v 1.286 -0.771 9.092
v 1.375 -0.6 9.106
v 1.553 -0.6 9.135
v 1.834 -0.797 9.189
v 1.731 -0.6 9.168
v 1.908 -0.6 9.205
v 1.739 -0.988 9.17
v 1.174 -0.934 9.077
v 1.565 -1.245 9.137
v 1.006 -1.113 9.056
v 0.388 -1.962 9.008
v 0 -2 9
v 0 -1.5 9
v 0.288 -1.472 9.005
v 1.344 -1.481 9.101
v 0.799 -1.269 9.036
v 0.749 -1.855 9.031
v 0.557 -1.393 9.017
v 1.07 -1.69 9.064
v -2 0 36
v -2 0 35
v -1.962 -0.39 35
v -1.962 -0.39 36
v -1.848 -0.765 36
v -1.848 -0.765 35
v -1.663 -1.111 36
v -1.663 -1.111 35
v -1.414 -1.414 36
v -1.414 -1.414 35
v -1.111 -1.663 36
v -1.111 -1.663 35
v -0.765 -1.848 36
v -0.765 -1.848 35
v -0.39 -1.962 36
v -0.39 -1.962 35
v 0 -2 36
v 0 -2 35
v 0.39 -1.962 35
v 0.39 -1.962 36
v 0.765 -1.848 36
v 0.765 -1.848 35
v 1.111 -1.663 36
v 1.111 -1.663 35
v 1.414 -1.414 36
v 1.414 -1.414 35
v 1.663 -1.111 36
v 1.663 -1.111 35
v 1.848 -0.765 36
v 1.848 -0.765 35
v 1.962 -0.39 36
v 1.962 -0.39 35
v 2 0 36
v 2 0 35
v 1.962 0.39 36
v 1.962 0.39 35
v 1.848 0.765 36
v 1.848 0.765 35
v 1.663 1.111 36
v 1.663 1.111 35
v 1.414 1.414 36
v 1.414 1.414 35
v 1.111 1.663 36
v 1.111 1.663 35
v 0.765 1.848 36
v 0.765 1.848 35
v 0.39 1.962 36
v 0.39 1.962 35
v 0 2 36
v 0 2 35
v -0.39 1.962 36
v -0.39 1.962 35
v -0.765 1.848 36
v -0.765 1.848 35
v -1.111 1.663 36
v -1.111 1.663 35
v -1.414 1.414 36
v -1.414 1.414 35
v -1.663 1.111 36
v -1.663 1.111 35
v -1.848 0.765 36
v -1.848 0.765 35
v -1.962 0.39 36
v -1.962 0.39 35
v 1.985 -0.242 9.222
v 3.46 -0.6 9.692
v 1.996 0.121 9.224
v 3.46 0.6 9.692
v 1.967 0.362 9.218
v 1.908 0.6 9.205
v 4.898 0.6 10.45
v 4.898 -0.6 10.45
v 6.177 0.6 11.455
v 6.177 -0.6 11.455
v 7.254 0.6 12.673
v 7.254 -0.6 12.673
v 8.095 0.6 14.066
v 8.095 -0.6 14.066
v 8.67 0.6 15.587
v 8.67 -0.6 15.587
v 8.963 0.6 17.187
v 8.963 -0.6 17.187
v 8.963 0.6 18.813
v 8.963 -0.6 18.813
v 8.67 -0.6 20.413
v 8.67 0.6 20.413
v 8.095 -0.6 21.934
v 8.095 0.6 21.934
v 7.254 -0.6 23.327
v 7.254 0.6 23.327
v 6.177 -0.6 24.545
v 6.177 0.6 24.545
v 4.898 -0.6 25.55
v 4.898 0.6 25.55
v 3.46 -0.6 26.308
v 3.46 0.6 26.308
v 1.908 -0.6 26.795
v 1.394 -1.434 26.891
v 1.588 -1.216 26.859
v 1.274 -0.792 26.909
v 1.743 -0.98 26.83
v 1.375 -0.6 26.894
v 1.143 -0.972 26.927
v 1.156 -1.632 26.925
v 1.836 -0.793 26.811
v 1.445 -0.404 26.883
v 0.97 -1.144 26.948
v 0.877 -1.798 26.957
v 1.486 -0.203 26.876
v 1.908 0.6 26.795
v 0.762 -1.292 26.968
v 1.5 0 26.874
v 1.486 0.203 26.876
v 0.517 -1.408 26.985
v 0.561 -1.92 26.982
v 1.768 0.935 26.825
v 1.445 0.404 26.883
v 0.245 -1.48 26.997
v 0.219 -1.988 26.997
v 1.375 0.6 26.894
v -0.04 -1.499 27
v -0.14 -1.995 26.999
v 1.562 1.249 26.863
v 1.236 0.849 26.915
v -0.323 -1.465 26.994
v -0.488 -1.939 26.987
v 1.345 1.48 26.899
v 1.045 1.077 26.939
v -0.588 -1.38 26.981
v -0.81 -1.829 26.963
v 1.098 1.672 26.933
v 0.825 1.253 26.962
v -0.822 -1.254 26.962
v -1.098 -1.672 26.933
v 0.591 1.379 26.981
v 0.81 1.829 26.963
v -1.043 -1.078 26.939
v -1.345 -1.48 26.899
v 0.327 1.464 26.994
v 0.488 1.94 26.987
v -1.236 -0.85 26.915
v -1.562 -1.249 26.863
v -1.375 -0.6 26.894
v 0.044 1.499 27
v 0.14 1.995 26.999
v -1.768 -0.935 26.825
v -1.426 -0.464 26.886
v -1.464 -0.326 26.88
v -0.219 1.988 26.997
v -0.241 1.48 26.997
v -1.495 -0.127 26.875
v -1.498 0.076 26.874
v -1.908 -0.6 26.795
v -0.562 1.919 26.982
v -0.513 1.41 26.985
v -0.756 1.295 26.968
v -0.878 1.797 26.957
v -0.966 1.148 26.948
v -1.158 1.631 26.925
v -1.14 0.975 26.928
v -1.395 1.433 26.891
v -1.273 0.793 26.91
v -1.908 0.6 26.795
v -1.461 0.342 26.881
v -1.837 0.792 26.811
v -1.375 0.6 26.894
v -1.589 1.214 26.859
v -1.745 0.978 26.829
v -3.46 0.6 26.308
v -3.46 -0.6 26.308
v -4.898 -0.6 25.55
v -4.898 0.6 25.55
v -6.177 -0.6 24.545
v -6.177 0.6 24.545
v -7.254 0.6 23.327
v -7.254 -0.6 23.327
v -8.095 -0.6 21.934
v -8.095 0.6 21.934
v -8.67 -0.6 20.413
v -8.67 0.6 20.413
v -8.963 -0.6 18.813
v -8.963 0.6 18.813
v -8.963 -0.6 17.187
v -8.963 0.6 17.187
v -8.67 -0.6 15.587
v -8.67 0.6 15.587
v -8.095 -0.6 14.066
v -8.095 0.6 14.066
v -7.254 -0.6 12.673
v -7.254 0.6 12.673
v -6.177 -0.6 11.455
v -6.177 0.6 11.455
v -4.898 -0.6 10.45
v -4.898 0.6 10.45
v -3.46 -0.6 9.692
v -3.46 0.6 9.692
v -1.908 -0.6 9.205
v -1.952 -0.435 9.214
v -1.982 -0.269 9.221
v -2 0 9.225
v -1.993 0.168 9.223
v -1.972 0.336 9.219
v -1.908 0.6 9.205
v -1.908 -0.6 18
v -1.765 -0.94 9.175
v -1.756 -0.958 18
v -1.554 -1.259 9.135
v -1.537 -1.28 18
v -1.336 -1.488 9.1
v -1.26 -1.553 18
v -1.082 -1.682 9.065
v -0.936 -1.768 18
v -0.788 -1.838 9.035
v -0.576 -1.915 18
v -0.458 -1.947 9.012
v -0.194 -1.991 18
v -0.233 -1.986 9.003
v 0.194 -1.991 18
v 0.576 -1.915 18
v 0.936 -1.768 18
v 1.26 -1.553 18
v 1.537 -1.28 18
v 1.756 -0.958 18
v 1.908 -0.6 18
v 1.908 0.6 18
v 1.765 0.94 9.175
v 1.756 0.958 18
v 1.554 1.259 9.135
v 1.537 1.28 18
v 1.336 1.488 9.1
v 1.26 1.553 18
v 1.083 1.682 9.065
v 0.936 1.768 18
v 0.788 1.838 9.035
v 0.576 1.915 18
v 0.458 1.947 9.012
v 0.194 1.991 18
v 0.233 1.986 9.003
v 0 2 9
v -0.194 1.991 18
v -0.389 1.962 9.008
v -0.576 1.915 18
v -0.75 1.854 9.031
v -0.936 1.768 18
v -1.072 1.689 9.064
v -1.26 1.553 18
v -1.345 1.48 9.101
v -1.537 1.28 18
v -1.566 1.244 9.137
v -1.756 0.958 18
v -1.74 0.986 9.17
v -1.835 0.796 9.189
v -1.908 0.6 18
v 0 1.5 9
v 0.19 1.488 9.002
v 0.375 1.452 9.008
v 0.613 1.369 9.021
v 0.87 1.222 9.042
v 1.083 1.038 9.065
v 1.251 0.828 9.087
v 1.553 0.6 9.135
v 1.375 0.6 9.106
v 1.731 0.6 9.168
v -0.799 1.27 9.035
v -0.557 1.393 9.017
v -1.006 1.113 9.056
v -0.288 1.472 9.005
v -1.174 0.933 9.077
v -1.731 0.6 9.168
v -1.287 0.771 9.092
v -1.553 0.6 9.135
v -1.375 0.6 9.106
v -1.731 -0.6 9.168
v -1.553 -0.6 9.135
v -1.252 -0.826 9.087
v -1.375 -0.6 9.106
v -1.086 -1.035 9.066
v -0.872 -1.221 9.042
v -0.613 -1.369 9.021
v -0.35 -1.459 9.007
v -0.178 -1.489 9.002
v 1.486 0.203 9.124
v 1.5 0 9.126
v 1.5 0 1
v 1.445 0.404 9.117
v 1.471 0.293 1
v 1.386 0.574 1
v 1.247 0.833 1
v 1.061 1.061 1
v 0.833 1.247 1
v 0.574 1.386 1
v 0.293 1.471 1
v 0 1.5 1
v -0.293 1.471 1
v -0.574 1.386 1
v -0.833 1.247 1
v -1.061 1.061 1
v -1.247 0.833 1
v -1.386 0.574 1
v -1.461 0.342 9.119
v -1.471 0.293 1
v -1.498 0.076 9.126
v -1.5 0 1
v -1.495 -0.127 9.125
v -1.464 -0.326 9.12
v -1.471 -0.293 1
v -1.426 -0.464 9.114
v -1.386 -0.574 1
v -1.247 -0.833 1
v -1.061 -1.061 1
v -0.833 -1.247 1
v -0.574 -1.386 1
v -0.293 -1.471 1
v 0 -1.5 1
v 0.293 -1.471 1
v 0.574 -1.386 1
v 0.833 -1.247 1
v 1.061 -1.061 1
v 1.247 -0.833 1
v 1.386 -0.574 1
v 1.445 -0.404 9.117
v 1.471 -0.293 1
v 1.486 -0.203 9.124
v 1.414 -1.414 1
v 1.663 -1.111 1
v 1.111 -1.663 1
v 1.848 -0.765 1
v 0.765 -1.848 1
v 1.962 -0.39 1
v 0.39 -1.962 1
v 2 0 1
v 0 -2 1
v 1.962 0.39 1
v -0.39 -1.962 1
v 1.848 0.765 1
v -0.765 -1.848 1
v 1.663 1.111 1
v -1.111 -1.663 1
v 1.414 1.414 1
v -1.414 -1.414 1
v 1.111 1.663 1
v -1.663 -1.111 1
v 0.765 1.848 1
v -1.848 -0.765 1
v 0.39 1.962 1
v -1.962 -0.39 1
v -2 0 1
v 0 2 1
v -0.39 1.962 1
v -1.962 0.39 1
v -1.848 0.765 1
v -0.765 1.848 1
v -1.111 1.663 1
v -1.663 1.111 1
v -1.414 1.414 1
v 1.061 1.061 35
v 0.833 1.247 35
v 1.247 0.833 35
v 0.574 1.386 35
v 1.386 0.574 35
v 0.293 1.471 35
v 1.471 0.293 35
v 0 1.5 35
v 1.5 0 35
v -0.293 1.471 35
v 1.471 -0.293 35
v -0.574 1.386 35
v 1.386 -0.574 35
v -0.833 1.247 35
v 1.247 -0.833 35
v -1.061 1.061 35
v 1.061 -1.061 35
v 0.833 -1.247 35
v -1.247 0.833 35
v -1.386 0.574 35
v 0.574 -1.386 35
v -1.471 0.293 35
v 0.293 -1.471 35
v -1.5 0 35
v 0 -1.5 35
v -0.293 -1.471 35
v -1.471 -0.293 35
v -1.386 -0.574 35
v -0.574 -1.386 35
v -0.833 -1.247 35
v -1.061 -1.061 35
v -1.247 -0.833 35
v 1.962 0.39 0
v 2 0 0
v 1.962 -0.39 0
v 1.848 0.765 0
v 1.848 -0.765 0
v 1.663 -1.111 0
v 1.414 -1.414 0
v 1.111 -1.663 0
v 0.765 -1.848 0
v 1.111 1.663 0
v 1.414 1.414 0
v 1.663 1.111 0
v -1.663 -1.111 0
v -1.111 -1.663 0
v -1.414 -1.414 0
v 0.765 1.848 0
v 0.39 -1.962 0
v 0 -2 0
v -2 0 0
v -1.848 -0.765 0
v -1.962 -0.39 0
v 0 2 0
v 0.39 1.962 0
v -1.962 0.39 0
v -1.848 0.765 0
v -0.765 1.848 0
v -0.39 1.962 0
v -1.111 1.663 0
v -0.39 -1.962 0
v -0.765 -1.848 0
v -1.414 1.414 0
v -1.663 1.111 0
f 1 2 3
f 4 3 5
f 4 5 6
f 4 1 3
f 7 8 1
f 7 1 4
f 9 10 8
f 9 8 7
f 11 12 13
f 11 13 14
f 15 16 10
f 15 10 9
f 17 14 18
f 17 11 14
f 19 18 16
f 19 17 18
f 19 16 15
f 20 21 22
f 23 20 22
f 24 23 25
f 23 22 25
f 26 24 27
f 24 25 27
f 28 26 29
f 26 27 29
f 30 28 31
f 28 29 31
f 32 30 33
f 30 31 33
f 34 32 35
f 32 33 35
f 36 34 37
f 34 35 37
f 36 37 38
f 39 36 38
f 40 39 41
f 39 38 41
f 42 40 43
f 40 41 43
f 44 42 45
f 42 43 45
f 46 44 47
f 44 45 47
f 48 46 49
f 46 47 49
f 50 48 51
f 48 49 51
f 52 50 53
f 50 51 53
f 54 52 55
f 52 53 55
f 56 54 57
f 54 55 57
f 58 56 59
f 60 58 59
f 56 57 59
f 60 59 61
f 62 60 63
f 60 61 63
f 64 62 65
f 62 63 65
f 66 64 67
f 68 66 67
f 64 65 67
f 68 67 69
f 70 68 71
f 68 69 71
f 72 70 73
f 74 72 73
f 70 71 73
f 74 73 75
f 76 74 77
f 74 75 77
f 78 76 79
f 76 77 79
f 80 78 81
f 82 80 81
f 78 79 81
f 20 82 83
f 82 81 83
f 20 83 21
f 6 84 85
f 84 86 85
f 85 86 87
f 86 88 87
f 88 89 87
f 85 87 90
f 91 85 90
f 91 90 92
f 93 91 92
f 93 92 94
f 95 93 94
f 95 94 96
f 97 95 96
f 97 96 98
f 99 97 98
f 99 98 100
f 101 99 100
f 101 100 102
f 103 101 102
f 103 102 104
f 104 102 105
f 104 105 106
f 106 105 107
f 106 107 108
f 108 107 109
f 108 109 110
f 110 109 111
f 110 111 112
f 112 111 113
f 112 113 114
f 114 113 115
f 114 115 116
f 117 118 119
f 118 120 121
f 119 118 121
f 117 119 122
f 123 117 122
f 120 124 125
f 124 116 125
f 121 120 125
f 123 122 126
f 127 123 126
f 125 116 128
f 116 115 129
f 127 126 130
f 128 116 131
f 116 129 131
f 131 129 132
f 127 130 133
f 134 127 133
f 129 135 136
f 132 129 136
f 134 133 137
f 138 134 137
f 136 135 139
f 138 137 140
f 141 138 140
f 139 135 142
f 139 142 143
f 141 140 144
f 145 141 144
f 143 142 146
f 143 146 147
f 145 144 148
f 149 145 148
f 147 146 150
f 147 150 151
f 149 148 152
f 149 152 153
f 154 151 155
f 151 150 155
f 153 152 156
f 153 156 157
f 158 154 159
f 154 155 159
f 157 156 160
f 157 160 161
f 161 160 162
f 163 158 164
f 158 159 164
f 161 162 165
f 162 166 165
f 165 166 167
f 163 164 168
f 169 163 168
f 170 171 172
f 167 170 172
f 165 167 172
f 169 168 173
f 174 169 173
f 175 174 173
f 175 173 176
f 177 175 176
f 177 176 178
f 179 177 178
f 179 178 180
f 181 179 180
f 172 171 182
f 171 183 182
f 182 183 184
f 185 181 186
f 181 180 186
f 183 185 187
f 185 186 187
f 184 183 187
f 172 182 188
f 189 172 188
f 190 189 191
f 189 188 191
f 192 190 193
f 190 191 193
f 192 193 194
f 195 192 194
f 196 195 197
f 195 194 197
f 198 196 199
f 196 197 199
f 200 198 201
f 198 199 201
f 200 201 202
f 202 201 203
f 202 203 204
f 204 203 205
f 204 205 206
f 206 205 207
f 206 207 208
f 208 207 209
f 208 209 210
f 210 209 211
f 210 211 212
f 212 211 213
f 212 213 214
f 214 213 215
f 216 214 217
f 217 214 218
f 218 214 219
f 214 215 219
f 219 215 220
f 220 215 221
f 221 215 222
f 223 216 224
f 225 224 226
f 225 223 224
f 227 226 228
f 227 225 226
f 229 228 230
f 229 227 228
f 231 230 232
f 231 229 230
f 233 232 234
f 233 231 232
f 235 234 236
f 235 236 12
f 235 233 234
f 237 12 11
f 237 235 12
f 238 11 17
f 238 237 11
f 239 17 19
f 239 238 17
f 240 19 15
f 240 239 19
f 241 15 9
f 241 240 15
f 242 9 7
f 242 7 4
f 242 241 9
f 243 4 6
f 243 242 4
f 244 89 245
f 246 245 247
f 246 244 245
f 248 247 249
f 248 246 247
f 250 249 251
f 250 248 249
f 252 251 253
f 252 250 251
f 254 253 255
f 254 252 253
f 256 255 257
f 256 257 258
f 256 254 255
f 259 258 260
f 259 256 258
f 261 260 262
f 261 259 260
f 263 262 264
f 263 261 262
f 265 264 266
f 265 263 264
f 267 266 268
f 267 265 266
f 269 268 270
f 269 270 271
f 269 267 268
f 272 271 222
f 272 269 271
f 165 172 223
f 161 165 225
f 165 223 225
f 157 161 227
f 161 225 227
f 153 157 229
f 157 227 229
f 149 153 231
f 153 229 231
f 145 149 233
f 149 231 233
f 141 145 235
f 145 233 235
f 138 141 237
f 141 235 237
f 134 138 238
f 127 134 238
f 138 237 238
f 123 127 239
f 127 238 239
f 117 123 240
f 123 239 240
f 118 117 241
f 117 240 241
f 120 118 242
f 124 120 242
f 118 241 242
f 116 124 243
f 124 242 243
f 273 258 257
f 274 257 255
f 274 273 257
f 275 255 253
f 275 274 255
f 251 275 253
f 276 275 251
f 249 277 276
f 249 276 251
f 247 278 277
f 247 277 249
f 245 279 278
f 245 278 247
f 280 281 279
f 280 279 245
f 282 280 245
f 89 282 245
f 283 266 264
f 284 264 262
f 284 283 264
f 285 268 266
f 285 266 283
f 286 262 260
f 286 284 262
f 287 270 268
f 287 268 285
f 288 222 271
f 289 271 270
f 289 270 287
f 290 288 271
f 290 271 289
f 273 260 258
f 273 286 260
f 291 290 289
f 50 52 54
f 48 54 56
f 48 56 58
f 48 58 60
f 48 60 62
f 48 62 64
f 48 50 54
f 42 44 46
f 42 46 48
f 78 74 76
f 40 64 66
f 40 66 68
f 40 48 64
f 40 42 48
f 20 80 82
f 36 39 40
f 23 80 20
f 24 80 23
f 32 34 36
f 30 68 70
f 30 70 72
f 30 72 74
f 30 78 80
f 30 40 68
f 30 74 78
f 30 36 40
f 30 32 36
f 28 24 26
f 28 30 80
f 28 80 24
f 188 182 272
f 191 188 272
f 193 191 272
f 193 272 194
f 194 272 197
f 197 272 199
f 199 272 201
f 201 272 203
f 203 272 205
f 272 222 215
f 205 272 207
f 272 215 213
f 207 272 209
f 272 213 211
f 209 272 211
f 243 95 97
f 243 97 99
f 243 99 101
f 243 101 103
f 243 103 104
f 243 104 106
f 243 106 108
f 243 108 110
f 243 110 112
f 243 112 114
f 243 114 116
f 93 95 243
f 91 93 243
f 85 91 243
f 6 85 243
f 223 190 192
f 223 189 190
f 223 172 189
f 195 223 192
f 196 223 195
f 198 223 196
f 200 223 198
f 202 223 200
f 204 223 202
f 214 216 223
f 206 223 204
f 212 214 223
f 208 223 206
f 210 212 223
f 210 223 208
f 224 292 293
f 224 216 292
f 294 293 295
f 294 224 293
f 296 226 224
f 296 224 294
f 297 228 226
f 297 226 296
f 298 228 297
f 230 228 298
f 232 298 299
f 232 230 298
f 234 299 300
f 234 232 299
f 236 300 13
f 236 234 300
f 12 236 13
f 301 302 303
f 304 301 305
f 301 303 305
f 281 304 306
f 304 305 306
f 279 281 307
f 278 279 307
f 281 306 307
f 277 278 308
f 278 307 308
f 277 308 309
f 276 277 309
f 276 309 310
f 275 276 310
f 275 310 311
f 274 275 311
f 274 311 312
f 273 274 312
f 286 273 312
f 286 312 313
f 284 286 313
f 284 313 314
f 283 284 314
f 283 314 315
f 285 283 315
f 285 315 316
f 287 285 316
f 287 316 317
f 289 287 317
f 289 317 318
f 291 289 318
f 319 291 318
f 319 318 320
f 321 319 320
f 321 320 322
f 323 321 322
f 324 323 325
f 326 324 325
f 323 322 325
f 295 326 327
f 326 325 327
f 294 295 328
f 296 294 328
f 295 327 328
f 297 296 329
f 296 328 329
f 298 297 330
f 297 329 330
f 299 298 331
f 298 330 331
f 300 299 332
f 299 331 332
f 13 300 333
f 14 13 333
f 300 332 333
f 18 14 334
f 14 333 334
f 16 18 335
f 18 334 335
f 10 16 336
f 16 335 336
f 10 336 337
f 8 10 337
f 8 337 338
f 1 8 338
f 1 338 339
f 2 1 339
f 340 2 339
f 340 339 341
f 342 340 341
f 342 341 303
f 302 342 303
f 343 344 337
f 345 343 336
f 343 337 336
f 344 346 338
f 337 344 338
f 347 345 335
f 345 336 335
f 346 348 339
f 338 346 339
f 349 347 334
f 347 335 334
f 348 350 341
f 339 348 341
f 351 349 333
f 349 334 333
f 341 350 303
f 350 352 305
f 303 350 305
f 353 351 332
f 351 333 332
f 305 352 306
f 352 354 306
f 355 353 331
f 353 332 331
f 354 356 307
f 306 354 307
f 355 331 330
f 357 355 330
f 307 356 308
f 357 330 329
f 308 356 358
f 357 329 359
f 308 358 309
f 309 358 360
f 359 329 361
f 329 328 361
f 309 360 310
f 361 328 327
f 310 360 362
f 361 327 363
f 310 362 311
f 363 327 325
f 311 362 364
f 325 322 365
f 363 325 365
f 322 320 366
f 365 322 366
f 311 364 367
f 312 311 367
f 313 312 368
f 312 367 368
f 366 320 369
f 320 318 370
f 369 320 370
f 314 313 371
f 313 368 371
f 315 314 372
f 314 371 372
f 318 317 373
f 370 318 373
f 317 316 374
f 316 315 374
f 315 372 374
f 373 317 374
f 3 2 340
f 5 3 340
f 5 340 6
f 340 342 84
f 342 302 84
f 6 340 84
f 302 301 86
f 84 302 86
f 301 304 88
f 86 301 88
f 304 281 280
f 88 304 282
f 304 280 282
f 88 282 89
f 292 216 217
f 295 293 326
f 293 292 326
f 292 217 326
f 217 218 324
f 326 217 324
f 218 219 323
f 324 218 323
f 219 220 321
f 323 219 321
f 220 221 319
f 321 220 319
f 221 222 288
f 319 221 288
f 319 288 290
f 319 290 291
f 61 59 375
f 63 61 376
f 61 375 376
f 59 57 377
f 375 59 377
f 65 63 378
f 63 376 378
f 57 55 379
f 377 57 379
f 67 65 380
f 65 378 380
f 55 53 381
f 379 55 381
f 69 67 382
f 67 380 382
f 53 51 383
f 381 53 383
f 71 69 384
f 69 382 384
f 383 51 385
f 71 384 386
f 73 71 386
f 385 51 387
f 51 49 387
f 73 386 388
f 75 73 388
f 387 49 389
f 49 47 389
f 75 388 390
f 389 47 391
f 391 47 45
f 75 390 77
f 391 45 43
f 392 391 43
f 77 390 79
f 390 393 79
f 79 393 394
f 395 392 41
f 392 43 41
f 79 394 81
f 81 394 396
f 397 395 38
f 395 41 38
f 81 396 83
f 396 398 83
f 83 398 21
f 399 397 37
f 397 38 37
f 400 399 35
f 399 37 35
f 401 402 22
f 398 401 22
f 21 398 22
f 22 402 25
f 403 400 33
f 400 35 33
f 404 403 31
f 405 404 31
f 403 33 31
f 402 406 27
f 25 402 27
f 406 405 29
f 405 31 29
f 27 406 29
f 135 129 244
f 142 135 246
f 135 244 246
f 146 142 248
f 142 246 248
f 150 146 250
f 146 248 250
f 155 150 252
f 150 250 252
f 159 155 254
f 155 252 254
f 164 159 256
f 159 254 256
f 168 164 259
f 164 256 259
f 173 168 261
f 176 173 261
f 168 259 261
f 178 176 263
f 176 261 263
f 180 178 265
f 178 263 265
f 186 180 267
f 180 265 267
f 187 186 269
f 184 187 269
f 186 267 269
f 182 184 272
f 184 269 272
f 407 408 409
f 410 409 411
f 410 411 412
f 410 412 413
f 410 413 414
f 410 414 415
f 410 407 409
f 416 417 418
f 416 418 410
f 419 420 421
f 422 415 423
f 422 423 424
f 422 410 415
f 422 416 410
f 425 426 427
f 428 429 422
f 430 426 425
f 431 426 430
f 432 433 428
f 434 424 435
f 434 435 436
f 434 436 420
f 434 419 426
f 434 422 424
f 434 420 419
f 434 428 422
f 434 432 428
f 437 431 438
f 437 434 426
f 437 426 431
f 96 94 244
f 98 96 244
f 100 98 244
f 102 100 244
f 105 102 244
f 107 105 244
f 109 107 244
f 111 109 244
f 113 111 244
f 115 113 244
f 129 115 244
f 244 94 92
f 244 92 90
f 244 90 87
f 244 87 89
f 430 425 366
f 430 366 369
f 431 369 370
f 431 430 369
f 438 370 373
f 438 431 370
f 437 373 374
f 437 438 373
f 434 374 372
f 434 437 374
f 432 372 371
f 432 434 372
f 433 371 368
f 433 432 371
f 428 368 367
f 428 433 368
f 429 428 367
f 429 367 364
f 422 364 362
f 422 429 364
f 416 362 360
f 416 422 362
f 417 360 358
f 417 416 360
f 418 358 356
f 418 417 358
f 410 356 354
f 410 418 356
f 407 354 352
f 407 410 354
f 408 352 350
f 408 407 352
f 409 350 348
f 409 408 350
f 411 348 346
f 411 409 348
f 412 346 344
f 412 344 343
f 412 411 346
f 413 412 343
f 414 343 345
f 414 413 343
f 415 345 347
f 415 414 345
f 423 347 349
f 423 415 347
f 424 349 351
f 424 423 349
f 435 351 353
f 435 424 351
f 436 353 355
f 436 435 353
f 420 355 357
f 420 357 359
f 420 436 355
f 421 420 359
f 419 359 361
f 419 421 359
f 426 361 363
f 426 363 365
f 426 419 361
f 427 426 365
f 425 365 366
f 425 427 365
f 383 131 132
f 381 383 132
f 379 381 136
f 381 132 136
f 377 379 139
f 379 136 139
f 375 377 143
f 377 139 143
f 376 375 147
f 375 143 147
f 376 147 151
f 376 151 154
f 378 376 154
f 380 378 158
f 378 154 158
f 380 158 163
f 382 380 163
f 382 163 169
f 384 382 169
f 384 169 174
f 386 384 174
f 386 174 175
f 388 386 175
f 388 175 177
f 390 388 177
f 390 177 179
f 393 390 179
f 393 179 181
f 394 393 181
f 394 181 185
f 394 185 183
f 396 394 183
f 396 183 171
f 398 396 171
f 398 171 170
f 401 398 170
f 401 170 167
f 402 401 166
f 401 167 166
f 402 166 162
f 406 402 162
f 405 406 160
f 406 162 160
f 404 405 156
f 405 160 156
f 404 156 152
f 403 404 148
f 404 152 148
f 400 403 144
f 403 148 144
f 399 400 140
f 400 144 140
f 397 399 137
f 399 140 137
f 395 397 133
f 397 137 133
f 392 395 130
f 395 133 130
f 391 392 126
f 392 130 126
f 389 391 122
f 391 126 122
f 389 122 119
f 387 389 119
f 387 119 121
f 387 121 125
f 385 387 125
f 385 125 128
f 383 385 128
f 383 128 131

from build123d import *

# Parameters (mm, degrees)
SKETCH1_R                            = 1.5
BOSS_EXTRUDE1_DEPTH                  = 36
SKETCH2_R                            = 2
BOSS_EXTRUDE2_DEPTH                  = 1
BOSS_EXTRUDE4_START                  = -1
SKETCH3_R                            = 2
BOSS_EXTRUDE4_DEPTH                  = 1
BOSS_EXTRUDE6_DEPTH                  = 0.6
BOSS_EXTRUDE6_DEPTH_BACK             = 0.6
SKETCH8_R                            = 9
BOSS_EXTRUDE5_REACH                  = 22.224
BOSS_EXTRUDE5_END_RADIUS             = 9
SKETCH4_R                            = 2
BOSS_EXTRUDE5_DIRECTION_2_REACH      = 22.224
BOSS_EXTRUDE5_DIRECTION_2_END_RADIUS = 9


with BuildPart() as part:
    # Sketch1 → Boss-Extrude1 (new body)
    with BuildSketch(Plane.XY):
        Circle(SKETCH1_R)
    extrude(amount=BOSS_EXTRUDE1_DEPTH)

    # Sketch2 → Boss-Extrude2 (add)
    with BuildSketch(Plane(origin=(0, 0, 0), x_dir=(-1, 0, 0), z_dir=(0, 0, -1))):
        Circle(SKETCH2_R)
    extrude(amount=-BOSS_EXTRUDE2_DEPTH)

    # Sketch3 → Boss-Extrude4 (add)
    with BuildSketch(Plane.XY.offset(36).offset(BOSS_EXTRUDE4_START)):
        Circle(SKETCH3_R)
    extrude(amount=BOSS_EXTRUDE4_DEPTH)

    # Sketch8 → Boss-Extrude6 (add, two sides: drawn at the far end of the back side and taken through both)
    with BuildSketch(Plane(origin=(0, 0, 0), x_dir=(-1, 0, 0), z_dir=(0, -1, 0)).offset(-BOSS_EXTRUDE6_DEPTH_BACK)):
        with Locations((0, -18)):
            Circle(SKETCH8_R)
    extrude(amount=BOSS_EXTRUDE6_DEPTH + BOSS_EXTRUDE6_DEPTH_BACK)

    # Boss-Extrude5: up to this cylinder (the profile starts inside it)
    boss_extrude5_end = Plane(origin=(0, 0, 18), z_dir=(0, -1, 0)) * Cylinder(BOSS_EXTRUDE5_END_RADIUS, 63.448, mode=Mode.PRIVATE)
    # Sketch4 → Boss-Extrude5 (add, up to the surface)
    with BuildSketch(Plane.XY.offset(18), mode=Mode.PRIVATE) as boss_extrude5_sk1:
        Circle(SKETCH4_R)
    boss_extrude5_tool1 = extrude(boss_extrude5_sk1.sketch, amount=BOSS_EXTRUDE5_REACH, mode=Mode.PRIVATE) & boss_extrude5_end
    add(boss_extrude5_tool1.solids().sort_by_distance((0, 0, 18))[0])

    # Boss-Extrude5 direction 2: up to this cylinder (the profile starts inside it)
    boss_extrude5_direction_2_end = Plane(origin=(0, 0, 18), z_dir=(0, -1, 0)) * Cylinder(BOSS_EXTRUDE5_DIRECTION_2_END_RADIUS, 63.448, mode=Mode.PRIVATE)
    # Sketch4 → Boss-Extrude5 direction 2 (add, up to the surface)
    with BuildSketch(Plane.XY.offset(18), mode=Mode.PRIVATE) as boss_extrude5_direction_2_sk1:
        Circle(SKETCH4_R)
    boss_extrude5_direction_2_tool1 = extrude(boss_extrude5_direction_2_sk1.sketch, amount=-BOSS_EXTRUDE5_DIRECTION_2_REACH, mode=Mode.PRIVATE) & boss_extrude5_direction_2_end
    add(boss_extrude5_direction_2_tool1.solids().sort_by_distance((0, 0, 18))[0])


solid = part.part
